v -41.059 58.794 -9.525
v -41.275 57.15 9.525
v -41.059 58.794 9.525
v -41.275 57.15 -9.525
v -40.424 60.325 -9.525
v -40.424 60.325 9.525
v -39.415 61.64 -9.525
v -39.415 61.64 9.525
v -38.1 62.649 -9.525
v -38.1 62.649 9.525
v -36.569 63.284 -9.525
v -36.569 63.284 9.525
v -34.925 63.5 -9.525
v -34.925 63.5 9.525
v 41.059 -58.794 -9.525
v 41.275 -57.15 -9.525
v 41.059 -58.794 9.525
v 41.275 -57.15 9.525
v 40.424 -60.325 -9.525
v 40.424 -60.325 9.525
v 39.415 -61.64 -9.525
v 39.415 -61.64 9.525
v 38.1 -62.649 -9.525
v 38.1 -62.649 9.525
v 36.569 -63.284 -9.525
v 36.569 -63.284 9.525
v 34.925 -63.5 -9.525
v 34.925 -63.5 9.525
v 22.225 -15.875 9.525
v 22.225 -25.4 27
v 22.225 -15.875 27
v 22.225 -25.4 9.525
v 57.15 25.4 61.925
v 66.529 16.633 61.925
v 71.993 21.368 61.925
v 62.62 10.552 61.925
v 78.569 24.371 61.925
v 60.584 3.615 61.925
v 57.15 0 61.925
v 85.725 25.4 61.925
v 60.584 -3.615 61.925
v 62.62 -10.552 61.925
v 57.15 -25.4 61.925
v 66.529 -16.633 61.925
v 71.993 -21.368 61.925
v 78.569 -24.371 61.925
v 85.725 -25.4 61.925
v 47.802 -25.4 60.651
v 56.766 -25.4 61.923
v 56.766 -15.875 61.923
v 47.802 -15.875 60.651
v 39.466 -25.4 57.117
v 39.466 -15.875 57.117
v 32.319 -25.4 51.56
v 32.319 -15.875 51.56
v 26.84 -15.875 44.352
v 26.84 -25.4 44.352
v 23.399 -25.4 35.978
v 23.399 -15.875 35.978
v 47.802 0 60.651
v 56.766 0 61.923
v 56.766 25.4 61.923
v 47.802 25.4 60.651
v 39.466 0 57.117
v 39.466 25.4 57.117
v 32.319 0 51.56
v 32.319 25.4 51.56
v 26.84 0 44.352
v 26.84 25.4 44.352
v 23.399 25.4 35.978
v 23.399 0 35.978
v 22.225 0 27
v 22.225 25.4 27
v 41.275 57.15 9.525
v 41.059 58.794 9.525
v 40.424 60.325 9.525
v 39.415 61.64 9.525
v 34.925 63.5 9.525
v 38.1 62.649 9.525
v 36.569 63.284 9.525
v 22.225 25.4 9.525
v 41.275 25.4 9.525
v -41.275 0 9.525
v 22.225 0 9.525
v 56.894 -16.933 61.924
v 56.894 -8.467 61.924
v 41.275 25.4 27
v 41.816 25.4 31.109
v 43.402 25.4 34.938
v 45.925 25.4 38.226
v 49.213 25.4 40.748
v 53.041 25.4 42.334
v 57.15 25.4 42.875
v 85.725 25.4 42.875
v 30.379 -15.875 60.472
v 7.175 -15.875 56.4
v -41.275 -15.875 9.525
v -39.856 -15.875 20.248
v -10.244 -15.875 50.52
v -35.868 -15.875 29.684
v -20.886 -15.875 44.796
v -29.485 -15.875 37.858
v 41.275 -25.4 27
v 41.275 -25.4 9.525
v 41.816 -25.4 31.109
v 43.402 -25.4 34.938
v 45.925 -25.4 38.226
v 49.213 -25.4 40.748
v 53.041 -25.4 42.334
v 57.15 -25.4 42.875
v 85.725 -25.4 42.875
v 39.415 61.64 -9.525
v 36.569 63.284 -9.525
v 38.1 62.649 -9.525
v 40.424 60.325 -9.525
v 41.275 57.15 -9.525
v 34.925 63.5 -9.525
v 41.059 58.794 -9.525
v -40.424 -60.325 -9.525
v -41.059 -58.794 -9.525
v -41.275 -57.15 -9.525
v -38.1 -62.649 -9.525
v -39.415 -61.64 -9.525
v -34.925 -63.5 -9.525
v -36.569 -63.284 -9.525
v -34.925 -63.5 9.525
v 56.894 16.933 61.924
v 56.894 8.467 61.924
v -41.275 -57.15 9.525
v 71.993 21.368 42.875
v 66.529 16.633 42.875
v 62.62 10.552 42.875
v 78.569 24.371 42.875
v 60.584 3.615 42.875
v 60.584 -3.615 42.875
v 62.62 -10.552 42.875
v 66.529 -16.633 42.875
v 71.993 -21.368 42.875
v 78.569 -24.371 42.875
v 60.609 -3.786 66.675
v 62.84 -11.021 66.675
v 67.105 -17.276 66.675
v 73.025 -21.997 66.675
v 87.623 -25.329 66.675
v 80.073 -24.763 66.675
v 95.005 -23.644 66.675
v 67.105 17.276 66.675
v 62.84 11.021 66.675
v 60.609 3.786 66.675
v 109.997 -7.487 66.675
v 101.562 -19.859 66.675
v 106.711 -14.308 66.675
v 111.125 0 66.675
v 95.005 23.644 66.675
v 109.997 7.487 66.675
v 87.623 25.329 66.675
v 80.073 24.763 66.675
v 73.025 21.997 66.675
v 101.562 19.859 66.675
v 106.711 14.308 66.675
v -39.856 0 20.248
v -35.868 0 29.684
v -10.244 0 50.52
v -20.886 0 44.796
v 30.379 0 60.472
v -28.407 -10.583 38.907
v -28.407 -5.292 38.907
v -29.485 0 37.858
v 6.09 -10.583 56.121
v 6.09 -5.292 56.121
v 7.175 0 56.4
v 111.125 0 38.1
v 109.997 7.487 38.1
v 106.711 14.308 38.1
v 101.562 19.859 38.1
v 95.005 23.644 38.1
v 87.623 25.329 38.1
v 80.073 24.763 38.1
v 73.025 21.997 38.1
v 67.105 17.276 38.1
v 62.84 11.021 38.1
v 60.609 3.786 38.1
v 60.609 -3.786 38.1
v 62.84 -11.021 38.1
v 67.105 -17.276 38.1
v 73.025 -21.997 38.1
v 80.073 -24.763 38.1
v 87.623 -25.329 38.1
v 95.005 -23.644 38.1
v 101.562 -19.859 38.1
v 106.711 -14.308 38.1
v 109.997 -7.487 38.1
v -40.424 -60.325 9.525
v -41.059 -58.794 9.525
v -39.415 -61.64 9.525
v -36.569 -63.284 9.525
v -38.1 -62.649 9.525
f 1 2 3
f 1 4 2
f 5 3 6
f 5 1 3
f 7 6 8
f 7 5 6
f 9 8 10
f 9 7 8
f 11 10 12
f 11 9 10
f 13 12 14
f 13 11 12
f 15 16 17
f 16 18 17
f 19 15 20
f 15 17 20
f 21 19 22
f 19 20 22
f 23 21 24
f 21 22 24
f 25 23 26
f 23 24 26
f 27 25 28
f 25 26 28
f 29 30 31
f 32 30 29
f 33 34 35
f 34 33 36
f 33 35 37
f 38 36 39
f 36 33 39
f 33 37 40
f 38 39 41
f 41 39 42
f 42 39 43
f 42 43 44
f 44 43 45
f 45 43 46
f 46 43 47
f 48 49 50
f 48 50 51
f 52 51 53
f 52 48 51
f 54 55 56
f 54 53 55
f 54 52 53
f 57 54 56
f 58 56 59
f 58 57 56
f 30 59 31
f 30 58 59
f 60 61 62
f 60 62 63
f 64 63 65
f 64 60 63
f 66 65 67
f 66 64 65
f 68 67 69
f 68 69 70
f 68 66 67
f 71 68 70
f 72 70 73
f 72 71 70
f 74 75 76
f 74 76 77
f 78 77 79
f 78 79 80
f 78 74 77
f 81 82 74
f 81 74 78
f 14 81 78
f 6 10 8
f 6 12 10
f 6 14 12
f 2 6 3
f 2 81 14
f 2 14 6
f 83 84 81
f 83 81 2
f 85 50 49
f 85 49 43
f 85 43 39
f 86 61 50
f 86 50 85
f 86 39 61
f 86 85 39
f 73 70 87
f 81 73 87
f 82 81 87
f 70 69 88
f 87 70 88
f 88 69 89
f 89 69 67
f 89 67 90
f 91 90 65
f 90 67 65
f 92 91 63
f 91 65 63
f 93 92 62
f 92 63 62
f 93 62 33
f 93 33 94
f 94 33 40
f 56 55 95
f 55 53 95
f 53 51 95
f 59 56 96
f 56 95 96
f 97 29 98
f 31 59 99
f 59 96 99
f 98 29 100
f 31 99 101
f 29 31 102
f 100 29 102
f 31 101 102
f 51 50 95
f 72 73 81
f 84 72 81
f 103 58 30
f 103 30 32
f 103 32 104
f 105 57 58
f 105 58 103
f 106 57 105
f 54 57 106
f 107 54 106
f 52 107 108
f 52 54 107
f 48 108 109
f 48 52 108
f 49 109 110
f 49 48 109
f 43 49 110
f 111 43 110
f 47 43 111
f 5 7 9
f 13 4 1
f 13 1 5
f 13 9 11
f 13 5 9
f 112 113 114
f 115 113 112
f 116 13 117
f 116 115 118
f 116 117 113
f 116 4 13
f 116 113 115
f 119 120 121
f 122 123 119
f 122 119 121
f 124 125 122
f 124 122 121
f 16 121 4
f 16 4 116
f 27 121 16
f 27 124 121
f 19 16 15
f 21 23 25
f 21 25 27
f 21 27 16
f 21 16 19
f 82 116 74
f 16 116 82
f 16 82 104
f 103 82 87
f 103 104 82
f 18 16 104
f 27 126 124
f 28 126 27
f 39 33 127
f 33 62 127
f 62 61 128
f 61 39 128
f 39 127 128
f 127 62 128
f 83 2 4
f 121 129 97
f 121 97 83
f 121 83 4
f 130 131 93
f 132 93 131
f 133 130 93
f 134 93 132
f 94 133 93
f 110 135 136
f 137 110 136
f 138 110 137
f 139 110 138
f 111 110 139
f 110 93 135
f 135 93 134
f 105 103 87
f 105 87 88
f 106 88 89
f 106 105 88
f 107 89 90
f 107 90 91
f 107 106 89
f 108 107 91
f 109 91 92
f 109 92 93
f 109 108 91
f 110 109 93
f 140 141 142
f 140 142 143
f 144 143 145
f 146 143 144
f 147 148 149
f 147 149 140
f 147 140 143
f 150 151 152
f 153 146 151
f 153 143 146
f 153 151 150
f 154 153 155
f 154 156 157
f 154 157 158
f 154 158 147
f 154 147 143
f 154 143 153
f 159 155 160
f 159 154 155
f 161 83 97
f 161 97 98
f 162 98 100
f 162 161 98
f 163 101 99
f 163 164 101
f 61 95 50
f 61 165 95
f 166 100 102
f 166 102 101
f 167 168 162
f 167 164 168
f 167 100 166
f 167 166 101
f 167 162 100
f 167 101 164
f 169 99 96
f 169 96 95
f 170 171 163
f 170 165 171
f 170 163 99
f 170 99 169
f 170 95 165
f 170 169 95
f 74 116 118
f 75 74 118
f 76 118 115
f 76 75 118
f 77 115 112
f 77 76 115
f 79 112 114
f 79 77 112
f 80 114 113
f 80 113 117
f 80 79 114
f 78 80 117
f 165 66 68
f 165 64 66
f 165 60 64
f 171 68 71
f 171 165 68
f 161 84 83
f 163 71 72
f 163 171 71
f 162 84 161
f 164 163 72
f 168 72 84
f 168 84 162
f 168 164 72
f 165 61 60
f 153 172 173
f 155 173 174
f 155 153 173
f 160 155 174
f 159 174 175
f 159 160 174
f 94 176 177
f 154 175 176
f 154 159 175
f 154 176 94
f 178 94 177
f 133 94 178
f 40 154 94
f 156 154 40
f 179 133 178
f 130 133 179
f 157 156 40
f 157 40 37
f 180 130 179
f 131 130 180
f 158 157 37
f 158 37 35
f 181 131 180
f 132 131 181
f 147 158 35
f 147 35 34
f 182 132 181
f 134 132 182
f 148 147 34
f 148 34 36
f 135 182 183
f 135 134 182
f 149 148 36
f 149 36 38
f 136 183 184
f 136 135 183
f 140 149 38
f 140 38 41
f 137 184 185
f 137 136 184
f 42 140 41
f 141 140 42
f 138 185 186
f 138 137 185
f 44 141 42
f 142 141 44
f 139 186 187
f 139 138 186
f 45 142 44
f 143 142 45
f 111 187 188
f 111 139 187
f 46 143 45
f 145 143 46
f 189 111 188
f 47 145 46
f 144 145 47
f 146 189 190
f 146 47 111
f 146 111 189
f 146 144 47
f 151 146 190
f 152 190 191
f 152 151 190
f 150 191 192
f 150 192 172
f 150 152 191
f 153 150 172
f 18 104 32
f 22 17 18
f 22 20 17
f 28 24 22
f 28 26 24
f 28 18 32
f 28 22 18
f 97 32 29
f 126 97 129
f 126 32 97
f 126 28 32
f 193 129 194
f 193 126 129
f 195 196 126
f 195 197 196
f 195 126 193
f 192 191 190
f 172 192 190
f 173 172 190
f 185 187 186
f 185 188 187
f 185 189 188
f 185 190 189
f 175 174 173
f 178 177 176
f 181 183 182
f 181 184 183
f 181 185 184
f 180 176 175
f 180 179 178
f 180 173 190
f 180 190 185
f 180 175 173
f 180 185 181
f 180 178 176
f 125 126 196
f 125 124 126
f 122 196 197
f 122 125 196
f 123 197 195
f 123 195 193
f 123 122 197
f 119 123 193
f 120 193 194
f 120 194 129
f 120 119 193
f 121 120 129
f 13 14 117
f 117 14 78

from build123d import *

# Parameters (mm, degrees)
F1_DEPTH = 63.5
F2_DEPTH = 25.4
F3_DEPTH = 15.875
F0_W     = 25.4
F0_H     = 19.05
F4_DEPTH = 25.4
F6_R     = 6.35


with BuildPart() as f1:
    # F0 (on Front) → F1 (new body, symmetric)
    with BuildSketch(Plane.XZ):
        Polygon((22.225, 9.525), (-41.275, 9.525), (-41.275, -9.525), (41.275, -9.525), (41.275, 9.525), align=None)
    extrude(amount=F1_DEPTH, both=True)

    # F0 (on Front) → F2 (join, symmetric)
    with BuildSketch(Plane.XZ):
        with BuildLine():
            Line((22.225, 27.0002), (22.225, 9.525))
            Line((22.225, 9.525), (41.275, 9.525))
            Line((41.275, 9.525), (41.275, 27.0002))
            ThreePointArc((41.275, 27.0002), (45.9246798487, 38.2255201513), (57.15, 42.8752))
            Line((57.15, 42.8752), (60.325, 42.8752))
            Line((60.325, 42.8752), (60.325, 61.9252))
            Line((60.325, 61.9252), (57.15, 61.9252))
            add(Edge.make_bspline(
                [(56.7658276627, 61.9230870029), (56.8938039219, 61.92387202), (57.0218614604, 61.9245763394), (57.15, 61.9252)],
                knots=[111.2545269173, 111.2545269173, 111.2545269173, 111.2545269173, 111.5045361635, 111.5045361635, 111.5045361635, 111.5045361635], degree=3))
            ThreePointArc((56.7658276627, 61.9230870029), (32.3188417117, 51.5597033146), (22.225, 27.0002))
        make_face()
    extrude(amount=F2_DEPTH, both=True)

    # F0 (on Front) → F3 (join)
    with BuildSketch(Plane.XZ):
        with BuildLine():
            add(Edge.make_bspline(
                [(-41.275, 9.525), (-41.0380026786, 45.2441586696), (-0.1838187392, 61.5737531077), (56.7658276627, 61.9230870029)],
                knots=[0, 0, 0, 0, 111.2545269173, 111.2545269173, 111.2545269173, 111.2545269173], degree=3))
            Line((-41.275, 9.525), (22.225, 9.525))
            Line((22.225, 9.525), (22.225, 27.0002))
            ThreePointArc((22.225, 27.0002), (32.3188417117, 51.5597033146), (56.7658276627, 61.9230870029))
        make_face()
    extrude(amount=F3_DEPTH)

    # F0 (on Front) → F4 (join, symmetric)
    with BuildSketch(Plane.XZ):
        with Locations((73.025, 52.4002)):
            Rectangle(F0_W, F0_H)
    extrude(amount=F4_DEPTH, both=True)

    # F0 (on Front) → F5 (revolve)
    with BuildSketch(Plane.XZ):
        Polygon((85.725, 66.675), (85.725, 61.9252), (85.725, 42.8752), (85.725, 38.1), (111.125, 38.1), (111.125, 66.675), align=None)
    revolve(axis=Axis((85.725, 0, 52.3875), (0, 0, 1)))

    # F6
    f6_edges = [f1.edges().sort_by_distance(p)[0] for p in [
        (41.275, -63.5, 0),
        (-41.275, -63.5, 0),
        (41.275, 63.5, 0),
        (-41.275, 63.5, 0),
    ]]
    fillet(f6_edges, radius=F6_R)


solid = f1.part
